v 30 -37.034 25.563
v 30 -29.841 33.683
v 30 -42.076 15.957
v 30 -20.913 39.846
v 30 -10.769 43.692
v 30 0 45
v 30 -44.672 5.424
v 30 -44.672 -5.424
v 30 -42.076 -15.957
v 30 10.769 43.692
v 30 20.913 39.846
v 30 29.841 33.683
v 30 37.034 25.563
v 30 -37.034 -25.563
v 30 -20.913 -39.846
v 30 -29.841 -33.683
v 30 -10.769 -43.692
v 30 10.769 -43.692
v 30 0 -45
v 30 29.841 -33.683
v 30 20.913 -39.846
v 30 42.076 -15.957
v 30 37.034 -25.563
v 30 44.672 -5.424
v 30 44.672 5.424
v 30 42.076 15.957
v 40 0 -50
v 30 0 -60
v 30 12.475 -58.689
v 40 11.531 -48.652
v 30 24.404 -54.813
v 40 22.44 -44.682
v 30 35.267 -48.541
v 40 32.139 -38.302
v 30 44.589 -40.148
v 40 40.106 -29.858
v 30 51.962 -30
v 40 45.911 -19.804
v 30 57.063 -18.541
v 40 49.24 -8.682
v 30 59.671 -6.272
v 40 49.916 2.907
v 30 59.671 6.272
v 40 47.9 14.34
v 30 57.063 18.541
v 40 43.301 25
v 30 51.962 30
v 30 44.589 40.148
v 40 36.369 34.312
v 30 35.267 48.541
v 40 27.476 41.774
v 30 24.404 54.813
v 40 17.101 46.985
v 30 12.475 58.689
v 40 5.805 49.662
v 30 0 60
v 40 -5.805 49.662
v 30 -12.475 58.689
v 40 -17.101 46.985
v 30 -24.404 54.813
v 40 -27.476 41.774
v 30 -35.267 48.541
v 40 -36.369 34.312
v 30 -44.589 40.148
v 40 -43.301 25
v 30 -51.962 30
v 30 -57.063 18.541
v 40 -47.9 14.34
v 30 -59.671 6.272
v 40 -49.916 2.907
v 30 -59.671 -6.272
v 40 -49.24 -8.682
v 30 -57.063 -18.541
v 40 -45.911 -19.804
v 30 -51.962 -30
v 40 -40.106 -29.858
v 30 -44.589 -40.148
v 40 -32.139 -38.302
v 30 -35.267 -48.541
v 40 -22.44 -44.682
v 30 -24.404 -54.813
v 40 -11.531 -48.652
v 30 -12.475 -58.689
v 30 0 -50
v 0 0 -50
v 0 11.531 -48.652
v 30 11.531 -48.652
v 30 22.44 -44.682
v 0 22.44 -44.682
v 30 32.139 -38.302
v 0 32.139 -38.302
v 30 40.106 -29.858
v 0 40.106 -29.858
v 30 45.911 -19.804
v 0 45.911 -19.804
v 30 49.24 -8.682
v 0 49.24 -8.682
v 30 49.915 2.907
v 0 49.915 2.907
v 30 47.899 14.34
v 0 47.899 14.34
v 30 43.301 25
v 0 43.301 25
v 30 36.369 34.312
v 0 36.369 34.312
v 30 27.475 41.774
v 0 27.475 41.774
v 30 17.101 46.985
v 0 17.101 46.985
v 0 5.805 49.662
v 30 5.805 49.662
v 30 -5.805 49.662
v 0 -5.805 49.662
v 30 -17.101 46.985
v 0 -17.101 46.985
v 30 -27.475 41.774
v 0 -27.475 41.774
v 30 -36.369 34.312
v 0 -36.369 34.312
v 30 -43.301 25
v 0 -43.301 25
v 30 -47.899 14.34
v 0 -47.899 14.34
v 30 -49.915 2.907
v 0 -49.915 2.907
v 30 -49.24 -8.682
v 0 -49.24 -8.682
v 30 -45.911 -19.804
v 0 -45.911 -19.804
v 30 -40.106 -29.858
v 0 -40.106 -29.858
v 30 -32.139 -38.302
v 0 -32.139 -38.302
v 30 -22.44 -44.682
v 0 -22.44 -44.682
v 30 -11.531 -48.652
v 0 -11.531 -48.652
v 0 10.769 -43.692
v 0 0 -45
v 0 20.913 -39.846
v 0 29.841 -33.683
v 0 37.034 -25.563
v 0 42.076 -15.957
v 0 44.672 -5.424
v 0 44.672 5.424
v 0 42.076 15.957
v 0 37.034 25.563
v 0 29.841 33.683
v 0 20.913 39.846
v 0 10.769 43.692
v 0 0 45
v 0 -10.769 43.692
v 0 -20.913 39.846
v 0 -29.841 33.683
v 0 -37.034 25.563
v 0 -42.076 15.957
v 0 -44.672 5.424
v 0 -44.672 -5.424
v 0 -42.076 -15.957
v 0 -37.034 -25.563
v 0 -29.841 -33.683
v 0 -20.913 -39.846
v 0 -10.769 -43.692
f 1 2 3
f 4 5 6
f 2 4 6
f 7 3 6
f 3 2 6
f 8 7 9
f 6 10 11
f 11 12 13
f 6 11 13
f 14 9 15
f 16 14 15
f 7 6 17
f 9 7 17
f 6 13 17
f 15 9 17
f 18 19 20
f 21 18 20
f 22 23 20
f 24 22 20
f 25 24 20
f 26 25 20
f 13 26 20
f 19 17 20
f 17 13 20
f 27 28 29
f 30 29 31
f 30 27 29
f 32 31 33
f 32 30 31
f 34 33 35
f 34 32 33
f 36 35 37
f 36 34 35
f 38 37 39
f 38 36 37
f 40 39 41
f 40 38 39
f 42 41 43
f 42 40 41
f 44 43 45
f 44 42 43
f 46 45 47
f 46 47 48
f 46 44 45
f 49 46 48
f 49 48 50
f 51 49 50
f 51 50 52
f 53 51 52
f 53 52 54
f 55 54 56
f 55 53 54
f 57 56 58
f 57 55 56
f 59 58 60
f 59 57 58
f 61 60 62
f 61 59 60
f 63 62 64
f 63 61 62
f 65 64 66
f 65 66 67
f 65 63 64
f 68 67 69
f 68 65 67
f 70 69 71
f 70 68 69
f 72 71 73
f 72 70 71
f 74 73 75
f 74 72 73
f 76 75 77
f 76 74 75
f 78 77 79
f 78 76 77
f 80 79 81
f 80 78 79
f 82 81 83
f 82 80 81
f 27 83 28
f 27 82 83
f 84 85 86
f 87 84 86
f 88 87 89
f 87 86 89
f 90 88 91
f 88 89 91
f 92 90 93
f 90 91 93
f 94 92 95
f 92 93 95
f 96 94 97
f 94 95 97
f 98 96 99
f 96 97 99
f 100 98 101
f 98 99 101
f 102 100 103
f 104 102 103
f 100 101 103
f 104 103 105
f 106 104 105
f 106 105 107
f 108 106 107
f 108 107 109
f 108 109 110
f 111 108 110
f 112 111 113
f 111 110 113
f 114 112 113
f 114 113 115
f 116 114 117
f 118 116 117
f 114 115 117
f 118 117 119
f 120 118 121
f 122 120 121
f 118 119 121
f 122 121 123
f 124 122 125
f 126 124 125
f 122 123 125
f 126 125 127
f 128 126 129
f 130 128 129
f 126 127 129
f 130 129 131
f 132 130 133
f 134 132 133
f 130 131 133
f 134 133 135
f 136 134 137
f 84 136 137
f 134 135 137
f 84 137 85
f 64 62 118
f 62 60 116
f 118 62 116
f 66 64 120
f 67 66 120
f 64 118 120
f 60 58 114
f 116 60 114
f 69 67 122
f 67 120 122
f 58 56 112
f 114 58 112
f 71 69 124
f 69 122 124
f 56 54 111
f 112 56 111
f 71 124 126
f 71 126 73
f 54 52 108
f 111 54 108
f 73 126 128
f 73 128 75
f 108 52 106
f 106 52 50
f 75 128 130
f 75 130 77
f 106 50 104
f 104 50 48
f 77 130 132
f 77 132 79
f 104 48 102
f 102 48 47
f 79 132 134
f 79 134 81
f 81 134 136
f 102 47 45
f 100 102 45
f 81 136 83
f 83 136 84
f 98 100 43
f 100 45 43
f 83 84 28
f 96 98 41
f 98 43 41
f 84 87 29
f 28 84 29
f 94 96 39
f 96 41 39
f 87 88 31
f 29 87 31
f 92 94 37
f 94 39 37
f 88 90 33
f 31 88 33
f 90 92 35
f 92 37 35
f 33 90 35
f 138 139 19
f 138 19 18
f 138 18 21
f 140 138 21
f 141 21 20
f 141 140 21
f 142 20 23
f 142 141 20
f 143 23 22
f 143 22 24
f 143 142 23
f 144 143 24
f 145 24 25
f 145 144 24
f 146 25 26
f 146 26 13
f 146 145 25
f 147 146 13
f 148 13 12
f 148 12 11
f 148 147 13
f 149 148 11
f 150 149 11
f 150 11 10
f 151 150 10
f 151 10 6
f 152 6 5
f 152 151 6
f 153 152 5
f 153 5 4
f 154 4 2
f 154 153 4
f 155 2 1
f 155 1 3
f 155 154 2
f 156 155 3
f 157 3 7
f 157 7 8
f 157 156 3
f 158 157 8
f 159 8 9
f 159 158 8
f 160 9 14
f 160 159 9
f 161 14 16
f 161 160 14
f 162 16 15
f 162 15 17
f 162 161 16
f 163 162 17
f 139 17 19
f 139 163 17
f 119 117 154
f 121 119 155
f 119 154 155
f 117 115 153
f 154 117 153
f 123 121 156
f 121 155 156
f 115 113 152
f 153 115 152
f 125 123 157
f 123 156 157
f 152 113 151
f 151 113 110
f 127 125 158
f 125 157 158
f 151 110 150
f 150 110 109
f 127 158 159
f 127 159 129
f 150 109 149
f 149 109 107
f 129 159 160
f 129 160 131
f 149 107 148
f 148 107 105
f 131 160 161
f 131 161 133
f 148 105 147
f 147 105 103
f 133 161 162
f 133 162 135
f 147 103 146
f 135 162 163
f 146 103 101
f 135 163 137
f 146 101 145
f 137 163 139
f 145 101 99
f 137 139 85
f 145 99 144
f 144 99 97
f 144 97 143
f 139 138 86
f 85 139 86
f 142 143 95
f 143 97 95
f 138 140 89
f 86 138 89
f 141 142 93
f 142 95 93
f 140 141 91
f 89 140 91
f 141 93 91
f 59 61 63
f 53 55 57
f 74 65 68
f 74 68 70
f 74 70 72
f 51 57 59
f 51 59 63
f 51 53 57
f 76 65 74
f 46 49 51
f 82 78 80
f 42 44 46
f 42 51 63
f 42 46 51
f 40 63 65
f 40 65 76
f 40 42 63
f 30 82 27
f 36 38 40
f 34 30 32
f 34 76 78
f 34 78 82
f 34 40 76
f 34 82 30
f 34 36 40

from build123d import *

# Parameters (mm, degrees)
SKETCH_1_R      = 50
SKETCH_1_R_2    = 45
EXTRUDE_1_DEPTH = 30
SKETCH_2_R      = 60
EXTRUDE_2_DEPTH = 10
CHAMFER_1_SIZE  = 10


with BuildPart() as part:
    # Эскиз1 → Бобышка-Вытянуть1 (new body)
    with BuildSketch(Plane(origin=(0, 0, 0), x_dir=(0, 0, -1), z_dir=(1, 0, 0))):
        Circle(SKETCH_1_R)
        Circle(SKETCH_1_R_2, mode=Mode.SUBTRACT)
    extrude(amount=EXTRUDE_1_DEPTH)

    # Эскиз2 → Бобышка-Вытянуть2 (add)
    with BuildSketch(Plane(origin=(30, 0, 0), x_dir=(0, 0, -1), z_dir=(1, 0, 0))):
        Circle(SKETCH_2_R)
    extrude(amount=EXTRUDE_2_DEPTH)

    # Фаска1
    chamfer_1_edges = [part.edges().sort_by_distance(p)[0] for p in [
        (40, 0, 60),
    ]]
    chamfer(chamfer_1_edges, length=CHAMFER_1_SIZE - 0.0001)  # a hair under: the kernel refuses the full size


solid = part.part
